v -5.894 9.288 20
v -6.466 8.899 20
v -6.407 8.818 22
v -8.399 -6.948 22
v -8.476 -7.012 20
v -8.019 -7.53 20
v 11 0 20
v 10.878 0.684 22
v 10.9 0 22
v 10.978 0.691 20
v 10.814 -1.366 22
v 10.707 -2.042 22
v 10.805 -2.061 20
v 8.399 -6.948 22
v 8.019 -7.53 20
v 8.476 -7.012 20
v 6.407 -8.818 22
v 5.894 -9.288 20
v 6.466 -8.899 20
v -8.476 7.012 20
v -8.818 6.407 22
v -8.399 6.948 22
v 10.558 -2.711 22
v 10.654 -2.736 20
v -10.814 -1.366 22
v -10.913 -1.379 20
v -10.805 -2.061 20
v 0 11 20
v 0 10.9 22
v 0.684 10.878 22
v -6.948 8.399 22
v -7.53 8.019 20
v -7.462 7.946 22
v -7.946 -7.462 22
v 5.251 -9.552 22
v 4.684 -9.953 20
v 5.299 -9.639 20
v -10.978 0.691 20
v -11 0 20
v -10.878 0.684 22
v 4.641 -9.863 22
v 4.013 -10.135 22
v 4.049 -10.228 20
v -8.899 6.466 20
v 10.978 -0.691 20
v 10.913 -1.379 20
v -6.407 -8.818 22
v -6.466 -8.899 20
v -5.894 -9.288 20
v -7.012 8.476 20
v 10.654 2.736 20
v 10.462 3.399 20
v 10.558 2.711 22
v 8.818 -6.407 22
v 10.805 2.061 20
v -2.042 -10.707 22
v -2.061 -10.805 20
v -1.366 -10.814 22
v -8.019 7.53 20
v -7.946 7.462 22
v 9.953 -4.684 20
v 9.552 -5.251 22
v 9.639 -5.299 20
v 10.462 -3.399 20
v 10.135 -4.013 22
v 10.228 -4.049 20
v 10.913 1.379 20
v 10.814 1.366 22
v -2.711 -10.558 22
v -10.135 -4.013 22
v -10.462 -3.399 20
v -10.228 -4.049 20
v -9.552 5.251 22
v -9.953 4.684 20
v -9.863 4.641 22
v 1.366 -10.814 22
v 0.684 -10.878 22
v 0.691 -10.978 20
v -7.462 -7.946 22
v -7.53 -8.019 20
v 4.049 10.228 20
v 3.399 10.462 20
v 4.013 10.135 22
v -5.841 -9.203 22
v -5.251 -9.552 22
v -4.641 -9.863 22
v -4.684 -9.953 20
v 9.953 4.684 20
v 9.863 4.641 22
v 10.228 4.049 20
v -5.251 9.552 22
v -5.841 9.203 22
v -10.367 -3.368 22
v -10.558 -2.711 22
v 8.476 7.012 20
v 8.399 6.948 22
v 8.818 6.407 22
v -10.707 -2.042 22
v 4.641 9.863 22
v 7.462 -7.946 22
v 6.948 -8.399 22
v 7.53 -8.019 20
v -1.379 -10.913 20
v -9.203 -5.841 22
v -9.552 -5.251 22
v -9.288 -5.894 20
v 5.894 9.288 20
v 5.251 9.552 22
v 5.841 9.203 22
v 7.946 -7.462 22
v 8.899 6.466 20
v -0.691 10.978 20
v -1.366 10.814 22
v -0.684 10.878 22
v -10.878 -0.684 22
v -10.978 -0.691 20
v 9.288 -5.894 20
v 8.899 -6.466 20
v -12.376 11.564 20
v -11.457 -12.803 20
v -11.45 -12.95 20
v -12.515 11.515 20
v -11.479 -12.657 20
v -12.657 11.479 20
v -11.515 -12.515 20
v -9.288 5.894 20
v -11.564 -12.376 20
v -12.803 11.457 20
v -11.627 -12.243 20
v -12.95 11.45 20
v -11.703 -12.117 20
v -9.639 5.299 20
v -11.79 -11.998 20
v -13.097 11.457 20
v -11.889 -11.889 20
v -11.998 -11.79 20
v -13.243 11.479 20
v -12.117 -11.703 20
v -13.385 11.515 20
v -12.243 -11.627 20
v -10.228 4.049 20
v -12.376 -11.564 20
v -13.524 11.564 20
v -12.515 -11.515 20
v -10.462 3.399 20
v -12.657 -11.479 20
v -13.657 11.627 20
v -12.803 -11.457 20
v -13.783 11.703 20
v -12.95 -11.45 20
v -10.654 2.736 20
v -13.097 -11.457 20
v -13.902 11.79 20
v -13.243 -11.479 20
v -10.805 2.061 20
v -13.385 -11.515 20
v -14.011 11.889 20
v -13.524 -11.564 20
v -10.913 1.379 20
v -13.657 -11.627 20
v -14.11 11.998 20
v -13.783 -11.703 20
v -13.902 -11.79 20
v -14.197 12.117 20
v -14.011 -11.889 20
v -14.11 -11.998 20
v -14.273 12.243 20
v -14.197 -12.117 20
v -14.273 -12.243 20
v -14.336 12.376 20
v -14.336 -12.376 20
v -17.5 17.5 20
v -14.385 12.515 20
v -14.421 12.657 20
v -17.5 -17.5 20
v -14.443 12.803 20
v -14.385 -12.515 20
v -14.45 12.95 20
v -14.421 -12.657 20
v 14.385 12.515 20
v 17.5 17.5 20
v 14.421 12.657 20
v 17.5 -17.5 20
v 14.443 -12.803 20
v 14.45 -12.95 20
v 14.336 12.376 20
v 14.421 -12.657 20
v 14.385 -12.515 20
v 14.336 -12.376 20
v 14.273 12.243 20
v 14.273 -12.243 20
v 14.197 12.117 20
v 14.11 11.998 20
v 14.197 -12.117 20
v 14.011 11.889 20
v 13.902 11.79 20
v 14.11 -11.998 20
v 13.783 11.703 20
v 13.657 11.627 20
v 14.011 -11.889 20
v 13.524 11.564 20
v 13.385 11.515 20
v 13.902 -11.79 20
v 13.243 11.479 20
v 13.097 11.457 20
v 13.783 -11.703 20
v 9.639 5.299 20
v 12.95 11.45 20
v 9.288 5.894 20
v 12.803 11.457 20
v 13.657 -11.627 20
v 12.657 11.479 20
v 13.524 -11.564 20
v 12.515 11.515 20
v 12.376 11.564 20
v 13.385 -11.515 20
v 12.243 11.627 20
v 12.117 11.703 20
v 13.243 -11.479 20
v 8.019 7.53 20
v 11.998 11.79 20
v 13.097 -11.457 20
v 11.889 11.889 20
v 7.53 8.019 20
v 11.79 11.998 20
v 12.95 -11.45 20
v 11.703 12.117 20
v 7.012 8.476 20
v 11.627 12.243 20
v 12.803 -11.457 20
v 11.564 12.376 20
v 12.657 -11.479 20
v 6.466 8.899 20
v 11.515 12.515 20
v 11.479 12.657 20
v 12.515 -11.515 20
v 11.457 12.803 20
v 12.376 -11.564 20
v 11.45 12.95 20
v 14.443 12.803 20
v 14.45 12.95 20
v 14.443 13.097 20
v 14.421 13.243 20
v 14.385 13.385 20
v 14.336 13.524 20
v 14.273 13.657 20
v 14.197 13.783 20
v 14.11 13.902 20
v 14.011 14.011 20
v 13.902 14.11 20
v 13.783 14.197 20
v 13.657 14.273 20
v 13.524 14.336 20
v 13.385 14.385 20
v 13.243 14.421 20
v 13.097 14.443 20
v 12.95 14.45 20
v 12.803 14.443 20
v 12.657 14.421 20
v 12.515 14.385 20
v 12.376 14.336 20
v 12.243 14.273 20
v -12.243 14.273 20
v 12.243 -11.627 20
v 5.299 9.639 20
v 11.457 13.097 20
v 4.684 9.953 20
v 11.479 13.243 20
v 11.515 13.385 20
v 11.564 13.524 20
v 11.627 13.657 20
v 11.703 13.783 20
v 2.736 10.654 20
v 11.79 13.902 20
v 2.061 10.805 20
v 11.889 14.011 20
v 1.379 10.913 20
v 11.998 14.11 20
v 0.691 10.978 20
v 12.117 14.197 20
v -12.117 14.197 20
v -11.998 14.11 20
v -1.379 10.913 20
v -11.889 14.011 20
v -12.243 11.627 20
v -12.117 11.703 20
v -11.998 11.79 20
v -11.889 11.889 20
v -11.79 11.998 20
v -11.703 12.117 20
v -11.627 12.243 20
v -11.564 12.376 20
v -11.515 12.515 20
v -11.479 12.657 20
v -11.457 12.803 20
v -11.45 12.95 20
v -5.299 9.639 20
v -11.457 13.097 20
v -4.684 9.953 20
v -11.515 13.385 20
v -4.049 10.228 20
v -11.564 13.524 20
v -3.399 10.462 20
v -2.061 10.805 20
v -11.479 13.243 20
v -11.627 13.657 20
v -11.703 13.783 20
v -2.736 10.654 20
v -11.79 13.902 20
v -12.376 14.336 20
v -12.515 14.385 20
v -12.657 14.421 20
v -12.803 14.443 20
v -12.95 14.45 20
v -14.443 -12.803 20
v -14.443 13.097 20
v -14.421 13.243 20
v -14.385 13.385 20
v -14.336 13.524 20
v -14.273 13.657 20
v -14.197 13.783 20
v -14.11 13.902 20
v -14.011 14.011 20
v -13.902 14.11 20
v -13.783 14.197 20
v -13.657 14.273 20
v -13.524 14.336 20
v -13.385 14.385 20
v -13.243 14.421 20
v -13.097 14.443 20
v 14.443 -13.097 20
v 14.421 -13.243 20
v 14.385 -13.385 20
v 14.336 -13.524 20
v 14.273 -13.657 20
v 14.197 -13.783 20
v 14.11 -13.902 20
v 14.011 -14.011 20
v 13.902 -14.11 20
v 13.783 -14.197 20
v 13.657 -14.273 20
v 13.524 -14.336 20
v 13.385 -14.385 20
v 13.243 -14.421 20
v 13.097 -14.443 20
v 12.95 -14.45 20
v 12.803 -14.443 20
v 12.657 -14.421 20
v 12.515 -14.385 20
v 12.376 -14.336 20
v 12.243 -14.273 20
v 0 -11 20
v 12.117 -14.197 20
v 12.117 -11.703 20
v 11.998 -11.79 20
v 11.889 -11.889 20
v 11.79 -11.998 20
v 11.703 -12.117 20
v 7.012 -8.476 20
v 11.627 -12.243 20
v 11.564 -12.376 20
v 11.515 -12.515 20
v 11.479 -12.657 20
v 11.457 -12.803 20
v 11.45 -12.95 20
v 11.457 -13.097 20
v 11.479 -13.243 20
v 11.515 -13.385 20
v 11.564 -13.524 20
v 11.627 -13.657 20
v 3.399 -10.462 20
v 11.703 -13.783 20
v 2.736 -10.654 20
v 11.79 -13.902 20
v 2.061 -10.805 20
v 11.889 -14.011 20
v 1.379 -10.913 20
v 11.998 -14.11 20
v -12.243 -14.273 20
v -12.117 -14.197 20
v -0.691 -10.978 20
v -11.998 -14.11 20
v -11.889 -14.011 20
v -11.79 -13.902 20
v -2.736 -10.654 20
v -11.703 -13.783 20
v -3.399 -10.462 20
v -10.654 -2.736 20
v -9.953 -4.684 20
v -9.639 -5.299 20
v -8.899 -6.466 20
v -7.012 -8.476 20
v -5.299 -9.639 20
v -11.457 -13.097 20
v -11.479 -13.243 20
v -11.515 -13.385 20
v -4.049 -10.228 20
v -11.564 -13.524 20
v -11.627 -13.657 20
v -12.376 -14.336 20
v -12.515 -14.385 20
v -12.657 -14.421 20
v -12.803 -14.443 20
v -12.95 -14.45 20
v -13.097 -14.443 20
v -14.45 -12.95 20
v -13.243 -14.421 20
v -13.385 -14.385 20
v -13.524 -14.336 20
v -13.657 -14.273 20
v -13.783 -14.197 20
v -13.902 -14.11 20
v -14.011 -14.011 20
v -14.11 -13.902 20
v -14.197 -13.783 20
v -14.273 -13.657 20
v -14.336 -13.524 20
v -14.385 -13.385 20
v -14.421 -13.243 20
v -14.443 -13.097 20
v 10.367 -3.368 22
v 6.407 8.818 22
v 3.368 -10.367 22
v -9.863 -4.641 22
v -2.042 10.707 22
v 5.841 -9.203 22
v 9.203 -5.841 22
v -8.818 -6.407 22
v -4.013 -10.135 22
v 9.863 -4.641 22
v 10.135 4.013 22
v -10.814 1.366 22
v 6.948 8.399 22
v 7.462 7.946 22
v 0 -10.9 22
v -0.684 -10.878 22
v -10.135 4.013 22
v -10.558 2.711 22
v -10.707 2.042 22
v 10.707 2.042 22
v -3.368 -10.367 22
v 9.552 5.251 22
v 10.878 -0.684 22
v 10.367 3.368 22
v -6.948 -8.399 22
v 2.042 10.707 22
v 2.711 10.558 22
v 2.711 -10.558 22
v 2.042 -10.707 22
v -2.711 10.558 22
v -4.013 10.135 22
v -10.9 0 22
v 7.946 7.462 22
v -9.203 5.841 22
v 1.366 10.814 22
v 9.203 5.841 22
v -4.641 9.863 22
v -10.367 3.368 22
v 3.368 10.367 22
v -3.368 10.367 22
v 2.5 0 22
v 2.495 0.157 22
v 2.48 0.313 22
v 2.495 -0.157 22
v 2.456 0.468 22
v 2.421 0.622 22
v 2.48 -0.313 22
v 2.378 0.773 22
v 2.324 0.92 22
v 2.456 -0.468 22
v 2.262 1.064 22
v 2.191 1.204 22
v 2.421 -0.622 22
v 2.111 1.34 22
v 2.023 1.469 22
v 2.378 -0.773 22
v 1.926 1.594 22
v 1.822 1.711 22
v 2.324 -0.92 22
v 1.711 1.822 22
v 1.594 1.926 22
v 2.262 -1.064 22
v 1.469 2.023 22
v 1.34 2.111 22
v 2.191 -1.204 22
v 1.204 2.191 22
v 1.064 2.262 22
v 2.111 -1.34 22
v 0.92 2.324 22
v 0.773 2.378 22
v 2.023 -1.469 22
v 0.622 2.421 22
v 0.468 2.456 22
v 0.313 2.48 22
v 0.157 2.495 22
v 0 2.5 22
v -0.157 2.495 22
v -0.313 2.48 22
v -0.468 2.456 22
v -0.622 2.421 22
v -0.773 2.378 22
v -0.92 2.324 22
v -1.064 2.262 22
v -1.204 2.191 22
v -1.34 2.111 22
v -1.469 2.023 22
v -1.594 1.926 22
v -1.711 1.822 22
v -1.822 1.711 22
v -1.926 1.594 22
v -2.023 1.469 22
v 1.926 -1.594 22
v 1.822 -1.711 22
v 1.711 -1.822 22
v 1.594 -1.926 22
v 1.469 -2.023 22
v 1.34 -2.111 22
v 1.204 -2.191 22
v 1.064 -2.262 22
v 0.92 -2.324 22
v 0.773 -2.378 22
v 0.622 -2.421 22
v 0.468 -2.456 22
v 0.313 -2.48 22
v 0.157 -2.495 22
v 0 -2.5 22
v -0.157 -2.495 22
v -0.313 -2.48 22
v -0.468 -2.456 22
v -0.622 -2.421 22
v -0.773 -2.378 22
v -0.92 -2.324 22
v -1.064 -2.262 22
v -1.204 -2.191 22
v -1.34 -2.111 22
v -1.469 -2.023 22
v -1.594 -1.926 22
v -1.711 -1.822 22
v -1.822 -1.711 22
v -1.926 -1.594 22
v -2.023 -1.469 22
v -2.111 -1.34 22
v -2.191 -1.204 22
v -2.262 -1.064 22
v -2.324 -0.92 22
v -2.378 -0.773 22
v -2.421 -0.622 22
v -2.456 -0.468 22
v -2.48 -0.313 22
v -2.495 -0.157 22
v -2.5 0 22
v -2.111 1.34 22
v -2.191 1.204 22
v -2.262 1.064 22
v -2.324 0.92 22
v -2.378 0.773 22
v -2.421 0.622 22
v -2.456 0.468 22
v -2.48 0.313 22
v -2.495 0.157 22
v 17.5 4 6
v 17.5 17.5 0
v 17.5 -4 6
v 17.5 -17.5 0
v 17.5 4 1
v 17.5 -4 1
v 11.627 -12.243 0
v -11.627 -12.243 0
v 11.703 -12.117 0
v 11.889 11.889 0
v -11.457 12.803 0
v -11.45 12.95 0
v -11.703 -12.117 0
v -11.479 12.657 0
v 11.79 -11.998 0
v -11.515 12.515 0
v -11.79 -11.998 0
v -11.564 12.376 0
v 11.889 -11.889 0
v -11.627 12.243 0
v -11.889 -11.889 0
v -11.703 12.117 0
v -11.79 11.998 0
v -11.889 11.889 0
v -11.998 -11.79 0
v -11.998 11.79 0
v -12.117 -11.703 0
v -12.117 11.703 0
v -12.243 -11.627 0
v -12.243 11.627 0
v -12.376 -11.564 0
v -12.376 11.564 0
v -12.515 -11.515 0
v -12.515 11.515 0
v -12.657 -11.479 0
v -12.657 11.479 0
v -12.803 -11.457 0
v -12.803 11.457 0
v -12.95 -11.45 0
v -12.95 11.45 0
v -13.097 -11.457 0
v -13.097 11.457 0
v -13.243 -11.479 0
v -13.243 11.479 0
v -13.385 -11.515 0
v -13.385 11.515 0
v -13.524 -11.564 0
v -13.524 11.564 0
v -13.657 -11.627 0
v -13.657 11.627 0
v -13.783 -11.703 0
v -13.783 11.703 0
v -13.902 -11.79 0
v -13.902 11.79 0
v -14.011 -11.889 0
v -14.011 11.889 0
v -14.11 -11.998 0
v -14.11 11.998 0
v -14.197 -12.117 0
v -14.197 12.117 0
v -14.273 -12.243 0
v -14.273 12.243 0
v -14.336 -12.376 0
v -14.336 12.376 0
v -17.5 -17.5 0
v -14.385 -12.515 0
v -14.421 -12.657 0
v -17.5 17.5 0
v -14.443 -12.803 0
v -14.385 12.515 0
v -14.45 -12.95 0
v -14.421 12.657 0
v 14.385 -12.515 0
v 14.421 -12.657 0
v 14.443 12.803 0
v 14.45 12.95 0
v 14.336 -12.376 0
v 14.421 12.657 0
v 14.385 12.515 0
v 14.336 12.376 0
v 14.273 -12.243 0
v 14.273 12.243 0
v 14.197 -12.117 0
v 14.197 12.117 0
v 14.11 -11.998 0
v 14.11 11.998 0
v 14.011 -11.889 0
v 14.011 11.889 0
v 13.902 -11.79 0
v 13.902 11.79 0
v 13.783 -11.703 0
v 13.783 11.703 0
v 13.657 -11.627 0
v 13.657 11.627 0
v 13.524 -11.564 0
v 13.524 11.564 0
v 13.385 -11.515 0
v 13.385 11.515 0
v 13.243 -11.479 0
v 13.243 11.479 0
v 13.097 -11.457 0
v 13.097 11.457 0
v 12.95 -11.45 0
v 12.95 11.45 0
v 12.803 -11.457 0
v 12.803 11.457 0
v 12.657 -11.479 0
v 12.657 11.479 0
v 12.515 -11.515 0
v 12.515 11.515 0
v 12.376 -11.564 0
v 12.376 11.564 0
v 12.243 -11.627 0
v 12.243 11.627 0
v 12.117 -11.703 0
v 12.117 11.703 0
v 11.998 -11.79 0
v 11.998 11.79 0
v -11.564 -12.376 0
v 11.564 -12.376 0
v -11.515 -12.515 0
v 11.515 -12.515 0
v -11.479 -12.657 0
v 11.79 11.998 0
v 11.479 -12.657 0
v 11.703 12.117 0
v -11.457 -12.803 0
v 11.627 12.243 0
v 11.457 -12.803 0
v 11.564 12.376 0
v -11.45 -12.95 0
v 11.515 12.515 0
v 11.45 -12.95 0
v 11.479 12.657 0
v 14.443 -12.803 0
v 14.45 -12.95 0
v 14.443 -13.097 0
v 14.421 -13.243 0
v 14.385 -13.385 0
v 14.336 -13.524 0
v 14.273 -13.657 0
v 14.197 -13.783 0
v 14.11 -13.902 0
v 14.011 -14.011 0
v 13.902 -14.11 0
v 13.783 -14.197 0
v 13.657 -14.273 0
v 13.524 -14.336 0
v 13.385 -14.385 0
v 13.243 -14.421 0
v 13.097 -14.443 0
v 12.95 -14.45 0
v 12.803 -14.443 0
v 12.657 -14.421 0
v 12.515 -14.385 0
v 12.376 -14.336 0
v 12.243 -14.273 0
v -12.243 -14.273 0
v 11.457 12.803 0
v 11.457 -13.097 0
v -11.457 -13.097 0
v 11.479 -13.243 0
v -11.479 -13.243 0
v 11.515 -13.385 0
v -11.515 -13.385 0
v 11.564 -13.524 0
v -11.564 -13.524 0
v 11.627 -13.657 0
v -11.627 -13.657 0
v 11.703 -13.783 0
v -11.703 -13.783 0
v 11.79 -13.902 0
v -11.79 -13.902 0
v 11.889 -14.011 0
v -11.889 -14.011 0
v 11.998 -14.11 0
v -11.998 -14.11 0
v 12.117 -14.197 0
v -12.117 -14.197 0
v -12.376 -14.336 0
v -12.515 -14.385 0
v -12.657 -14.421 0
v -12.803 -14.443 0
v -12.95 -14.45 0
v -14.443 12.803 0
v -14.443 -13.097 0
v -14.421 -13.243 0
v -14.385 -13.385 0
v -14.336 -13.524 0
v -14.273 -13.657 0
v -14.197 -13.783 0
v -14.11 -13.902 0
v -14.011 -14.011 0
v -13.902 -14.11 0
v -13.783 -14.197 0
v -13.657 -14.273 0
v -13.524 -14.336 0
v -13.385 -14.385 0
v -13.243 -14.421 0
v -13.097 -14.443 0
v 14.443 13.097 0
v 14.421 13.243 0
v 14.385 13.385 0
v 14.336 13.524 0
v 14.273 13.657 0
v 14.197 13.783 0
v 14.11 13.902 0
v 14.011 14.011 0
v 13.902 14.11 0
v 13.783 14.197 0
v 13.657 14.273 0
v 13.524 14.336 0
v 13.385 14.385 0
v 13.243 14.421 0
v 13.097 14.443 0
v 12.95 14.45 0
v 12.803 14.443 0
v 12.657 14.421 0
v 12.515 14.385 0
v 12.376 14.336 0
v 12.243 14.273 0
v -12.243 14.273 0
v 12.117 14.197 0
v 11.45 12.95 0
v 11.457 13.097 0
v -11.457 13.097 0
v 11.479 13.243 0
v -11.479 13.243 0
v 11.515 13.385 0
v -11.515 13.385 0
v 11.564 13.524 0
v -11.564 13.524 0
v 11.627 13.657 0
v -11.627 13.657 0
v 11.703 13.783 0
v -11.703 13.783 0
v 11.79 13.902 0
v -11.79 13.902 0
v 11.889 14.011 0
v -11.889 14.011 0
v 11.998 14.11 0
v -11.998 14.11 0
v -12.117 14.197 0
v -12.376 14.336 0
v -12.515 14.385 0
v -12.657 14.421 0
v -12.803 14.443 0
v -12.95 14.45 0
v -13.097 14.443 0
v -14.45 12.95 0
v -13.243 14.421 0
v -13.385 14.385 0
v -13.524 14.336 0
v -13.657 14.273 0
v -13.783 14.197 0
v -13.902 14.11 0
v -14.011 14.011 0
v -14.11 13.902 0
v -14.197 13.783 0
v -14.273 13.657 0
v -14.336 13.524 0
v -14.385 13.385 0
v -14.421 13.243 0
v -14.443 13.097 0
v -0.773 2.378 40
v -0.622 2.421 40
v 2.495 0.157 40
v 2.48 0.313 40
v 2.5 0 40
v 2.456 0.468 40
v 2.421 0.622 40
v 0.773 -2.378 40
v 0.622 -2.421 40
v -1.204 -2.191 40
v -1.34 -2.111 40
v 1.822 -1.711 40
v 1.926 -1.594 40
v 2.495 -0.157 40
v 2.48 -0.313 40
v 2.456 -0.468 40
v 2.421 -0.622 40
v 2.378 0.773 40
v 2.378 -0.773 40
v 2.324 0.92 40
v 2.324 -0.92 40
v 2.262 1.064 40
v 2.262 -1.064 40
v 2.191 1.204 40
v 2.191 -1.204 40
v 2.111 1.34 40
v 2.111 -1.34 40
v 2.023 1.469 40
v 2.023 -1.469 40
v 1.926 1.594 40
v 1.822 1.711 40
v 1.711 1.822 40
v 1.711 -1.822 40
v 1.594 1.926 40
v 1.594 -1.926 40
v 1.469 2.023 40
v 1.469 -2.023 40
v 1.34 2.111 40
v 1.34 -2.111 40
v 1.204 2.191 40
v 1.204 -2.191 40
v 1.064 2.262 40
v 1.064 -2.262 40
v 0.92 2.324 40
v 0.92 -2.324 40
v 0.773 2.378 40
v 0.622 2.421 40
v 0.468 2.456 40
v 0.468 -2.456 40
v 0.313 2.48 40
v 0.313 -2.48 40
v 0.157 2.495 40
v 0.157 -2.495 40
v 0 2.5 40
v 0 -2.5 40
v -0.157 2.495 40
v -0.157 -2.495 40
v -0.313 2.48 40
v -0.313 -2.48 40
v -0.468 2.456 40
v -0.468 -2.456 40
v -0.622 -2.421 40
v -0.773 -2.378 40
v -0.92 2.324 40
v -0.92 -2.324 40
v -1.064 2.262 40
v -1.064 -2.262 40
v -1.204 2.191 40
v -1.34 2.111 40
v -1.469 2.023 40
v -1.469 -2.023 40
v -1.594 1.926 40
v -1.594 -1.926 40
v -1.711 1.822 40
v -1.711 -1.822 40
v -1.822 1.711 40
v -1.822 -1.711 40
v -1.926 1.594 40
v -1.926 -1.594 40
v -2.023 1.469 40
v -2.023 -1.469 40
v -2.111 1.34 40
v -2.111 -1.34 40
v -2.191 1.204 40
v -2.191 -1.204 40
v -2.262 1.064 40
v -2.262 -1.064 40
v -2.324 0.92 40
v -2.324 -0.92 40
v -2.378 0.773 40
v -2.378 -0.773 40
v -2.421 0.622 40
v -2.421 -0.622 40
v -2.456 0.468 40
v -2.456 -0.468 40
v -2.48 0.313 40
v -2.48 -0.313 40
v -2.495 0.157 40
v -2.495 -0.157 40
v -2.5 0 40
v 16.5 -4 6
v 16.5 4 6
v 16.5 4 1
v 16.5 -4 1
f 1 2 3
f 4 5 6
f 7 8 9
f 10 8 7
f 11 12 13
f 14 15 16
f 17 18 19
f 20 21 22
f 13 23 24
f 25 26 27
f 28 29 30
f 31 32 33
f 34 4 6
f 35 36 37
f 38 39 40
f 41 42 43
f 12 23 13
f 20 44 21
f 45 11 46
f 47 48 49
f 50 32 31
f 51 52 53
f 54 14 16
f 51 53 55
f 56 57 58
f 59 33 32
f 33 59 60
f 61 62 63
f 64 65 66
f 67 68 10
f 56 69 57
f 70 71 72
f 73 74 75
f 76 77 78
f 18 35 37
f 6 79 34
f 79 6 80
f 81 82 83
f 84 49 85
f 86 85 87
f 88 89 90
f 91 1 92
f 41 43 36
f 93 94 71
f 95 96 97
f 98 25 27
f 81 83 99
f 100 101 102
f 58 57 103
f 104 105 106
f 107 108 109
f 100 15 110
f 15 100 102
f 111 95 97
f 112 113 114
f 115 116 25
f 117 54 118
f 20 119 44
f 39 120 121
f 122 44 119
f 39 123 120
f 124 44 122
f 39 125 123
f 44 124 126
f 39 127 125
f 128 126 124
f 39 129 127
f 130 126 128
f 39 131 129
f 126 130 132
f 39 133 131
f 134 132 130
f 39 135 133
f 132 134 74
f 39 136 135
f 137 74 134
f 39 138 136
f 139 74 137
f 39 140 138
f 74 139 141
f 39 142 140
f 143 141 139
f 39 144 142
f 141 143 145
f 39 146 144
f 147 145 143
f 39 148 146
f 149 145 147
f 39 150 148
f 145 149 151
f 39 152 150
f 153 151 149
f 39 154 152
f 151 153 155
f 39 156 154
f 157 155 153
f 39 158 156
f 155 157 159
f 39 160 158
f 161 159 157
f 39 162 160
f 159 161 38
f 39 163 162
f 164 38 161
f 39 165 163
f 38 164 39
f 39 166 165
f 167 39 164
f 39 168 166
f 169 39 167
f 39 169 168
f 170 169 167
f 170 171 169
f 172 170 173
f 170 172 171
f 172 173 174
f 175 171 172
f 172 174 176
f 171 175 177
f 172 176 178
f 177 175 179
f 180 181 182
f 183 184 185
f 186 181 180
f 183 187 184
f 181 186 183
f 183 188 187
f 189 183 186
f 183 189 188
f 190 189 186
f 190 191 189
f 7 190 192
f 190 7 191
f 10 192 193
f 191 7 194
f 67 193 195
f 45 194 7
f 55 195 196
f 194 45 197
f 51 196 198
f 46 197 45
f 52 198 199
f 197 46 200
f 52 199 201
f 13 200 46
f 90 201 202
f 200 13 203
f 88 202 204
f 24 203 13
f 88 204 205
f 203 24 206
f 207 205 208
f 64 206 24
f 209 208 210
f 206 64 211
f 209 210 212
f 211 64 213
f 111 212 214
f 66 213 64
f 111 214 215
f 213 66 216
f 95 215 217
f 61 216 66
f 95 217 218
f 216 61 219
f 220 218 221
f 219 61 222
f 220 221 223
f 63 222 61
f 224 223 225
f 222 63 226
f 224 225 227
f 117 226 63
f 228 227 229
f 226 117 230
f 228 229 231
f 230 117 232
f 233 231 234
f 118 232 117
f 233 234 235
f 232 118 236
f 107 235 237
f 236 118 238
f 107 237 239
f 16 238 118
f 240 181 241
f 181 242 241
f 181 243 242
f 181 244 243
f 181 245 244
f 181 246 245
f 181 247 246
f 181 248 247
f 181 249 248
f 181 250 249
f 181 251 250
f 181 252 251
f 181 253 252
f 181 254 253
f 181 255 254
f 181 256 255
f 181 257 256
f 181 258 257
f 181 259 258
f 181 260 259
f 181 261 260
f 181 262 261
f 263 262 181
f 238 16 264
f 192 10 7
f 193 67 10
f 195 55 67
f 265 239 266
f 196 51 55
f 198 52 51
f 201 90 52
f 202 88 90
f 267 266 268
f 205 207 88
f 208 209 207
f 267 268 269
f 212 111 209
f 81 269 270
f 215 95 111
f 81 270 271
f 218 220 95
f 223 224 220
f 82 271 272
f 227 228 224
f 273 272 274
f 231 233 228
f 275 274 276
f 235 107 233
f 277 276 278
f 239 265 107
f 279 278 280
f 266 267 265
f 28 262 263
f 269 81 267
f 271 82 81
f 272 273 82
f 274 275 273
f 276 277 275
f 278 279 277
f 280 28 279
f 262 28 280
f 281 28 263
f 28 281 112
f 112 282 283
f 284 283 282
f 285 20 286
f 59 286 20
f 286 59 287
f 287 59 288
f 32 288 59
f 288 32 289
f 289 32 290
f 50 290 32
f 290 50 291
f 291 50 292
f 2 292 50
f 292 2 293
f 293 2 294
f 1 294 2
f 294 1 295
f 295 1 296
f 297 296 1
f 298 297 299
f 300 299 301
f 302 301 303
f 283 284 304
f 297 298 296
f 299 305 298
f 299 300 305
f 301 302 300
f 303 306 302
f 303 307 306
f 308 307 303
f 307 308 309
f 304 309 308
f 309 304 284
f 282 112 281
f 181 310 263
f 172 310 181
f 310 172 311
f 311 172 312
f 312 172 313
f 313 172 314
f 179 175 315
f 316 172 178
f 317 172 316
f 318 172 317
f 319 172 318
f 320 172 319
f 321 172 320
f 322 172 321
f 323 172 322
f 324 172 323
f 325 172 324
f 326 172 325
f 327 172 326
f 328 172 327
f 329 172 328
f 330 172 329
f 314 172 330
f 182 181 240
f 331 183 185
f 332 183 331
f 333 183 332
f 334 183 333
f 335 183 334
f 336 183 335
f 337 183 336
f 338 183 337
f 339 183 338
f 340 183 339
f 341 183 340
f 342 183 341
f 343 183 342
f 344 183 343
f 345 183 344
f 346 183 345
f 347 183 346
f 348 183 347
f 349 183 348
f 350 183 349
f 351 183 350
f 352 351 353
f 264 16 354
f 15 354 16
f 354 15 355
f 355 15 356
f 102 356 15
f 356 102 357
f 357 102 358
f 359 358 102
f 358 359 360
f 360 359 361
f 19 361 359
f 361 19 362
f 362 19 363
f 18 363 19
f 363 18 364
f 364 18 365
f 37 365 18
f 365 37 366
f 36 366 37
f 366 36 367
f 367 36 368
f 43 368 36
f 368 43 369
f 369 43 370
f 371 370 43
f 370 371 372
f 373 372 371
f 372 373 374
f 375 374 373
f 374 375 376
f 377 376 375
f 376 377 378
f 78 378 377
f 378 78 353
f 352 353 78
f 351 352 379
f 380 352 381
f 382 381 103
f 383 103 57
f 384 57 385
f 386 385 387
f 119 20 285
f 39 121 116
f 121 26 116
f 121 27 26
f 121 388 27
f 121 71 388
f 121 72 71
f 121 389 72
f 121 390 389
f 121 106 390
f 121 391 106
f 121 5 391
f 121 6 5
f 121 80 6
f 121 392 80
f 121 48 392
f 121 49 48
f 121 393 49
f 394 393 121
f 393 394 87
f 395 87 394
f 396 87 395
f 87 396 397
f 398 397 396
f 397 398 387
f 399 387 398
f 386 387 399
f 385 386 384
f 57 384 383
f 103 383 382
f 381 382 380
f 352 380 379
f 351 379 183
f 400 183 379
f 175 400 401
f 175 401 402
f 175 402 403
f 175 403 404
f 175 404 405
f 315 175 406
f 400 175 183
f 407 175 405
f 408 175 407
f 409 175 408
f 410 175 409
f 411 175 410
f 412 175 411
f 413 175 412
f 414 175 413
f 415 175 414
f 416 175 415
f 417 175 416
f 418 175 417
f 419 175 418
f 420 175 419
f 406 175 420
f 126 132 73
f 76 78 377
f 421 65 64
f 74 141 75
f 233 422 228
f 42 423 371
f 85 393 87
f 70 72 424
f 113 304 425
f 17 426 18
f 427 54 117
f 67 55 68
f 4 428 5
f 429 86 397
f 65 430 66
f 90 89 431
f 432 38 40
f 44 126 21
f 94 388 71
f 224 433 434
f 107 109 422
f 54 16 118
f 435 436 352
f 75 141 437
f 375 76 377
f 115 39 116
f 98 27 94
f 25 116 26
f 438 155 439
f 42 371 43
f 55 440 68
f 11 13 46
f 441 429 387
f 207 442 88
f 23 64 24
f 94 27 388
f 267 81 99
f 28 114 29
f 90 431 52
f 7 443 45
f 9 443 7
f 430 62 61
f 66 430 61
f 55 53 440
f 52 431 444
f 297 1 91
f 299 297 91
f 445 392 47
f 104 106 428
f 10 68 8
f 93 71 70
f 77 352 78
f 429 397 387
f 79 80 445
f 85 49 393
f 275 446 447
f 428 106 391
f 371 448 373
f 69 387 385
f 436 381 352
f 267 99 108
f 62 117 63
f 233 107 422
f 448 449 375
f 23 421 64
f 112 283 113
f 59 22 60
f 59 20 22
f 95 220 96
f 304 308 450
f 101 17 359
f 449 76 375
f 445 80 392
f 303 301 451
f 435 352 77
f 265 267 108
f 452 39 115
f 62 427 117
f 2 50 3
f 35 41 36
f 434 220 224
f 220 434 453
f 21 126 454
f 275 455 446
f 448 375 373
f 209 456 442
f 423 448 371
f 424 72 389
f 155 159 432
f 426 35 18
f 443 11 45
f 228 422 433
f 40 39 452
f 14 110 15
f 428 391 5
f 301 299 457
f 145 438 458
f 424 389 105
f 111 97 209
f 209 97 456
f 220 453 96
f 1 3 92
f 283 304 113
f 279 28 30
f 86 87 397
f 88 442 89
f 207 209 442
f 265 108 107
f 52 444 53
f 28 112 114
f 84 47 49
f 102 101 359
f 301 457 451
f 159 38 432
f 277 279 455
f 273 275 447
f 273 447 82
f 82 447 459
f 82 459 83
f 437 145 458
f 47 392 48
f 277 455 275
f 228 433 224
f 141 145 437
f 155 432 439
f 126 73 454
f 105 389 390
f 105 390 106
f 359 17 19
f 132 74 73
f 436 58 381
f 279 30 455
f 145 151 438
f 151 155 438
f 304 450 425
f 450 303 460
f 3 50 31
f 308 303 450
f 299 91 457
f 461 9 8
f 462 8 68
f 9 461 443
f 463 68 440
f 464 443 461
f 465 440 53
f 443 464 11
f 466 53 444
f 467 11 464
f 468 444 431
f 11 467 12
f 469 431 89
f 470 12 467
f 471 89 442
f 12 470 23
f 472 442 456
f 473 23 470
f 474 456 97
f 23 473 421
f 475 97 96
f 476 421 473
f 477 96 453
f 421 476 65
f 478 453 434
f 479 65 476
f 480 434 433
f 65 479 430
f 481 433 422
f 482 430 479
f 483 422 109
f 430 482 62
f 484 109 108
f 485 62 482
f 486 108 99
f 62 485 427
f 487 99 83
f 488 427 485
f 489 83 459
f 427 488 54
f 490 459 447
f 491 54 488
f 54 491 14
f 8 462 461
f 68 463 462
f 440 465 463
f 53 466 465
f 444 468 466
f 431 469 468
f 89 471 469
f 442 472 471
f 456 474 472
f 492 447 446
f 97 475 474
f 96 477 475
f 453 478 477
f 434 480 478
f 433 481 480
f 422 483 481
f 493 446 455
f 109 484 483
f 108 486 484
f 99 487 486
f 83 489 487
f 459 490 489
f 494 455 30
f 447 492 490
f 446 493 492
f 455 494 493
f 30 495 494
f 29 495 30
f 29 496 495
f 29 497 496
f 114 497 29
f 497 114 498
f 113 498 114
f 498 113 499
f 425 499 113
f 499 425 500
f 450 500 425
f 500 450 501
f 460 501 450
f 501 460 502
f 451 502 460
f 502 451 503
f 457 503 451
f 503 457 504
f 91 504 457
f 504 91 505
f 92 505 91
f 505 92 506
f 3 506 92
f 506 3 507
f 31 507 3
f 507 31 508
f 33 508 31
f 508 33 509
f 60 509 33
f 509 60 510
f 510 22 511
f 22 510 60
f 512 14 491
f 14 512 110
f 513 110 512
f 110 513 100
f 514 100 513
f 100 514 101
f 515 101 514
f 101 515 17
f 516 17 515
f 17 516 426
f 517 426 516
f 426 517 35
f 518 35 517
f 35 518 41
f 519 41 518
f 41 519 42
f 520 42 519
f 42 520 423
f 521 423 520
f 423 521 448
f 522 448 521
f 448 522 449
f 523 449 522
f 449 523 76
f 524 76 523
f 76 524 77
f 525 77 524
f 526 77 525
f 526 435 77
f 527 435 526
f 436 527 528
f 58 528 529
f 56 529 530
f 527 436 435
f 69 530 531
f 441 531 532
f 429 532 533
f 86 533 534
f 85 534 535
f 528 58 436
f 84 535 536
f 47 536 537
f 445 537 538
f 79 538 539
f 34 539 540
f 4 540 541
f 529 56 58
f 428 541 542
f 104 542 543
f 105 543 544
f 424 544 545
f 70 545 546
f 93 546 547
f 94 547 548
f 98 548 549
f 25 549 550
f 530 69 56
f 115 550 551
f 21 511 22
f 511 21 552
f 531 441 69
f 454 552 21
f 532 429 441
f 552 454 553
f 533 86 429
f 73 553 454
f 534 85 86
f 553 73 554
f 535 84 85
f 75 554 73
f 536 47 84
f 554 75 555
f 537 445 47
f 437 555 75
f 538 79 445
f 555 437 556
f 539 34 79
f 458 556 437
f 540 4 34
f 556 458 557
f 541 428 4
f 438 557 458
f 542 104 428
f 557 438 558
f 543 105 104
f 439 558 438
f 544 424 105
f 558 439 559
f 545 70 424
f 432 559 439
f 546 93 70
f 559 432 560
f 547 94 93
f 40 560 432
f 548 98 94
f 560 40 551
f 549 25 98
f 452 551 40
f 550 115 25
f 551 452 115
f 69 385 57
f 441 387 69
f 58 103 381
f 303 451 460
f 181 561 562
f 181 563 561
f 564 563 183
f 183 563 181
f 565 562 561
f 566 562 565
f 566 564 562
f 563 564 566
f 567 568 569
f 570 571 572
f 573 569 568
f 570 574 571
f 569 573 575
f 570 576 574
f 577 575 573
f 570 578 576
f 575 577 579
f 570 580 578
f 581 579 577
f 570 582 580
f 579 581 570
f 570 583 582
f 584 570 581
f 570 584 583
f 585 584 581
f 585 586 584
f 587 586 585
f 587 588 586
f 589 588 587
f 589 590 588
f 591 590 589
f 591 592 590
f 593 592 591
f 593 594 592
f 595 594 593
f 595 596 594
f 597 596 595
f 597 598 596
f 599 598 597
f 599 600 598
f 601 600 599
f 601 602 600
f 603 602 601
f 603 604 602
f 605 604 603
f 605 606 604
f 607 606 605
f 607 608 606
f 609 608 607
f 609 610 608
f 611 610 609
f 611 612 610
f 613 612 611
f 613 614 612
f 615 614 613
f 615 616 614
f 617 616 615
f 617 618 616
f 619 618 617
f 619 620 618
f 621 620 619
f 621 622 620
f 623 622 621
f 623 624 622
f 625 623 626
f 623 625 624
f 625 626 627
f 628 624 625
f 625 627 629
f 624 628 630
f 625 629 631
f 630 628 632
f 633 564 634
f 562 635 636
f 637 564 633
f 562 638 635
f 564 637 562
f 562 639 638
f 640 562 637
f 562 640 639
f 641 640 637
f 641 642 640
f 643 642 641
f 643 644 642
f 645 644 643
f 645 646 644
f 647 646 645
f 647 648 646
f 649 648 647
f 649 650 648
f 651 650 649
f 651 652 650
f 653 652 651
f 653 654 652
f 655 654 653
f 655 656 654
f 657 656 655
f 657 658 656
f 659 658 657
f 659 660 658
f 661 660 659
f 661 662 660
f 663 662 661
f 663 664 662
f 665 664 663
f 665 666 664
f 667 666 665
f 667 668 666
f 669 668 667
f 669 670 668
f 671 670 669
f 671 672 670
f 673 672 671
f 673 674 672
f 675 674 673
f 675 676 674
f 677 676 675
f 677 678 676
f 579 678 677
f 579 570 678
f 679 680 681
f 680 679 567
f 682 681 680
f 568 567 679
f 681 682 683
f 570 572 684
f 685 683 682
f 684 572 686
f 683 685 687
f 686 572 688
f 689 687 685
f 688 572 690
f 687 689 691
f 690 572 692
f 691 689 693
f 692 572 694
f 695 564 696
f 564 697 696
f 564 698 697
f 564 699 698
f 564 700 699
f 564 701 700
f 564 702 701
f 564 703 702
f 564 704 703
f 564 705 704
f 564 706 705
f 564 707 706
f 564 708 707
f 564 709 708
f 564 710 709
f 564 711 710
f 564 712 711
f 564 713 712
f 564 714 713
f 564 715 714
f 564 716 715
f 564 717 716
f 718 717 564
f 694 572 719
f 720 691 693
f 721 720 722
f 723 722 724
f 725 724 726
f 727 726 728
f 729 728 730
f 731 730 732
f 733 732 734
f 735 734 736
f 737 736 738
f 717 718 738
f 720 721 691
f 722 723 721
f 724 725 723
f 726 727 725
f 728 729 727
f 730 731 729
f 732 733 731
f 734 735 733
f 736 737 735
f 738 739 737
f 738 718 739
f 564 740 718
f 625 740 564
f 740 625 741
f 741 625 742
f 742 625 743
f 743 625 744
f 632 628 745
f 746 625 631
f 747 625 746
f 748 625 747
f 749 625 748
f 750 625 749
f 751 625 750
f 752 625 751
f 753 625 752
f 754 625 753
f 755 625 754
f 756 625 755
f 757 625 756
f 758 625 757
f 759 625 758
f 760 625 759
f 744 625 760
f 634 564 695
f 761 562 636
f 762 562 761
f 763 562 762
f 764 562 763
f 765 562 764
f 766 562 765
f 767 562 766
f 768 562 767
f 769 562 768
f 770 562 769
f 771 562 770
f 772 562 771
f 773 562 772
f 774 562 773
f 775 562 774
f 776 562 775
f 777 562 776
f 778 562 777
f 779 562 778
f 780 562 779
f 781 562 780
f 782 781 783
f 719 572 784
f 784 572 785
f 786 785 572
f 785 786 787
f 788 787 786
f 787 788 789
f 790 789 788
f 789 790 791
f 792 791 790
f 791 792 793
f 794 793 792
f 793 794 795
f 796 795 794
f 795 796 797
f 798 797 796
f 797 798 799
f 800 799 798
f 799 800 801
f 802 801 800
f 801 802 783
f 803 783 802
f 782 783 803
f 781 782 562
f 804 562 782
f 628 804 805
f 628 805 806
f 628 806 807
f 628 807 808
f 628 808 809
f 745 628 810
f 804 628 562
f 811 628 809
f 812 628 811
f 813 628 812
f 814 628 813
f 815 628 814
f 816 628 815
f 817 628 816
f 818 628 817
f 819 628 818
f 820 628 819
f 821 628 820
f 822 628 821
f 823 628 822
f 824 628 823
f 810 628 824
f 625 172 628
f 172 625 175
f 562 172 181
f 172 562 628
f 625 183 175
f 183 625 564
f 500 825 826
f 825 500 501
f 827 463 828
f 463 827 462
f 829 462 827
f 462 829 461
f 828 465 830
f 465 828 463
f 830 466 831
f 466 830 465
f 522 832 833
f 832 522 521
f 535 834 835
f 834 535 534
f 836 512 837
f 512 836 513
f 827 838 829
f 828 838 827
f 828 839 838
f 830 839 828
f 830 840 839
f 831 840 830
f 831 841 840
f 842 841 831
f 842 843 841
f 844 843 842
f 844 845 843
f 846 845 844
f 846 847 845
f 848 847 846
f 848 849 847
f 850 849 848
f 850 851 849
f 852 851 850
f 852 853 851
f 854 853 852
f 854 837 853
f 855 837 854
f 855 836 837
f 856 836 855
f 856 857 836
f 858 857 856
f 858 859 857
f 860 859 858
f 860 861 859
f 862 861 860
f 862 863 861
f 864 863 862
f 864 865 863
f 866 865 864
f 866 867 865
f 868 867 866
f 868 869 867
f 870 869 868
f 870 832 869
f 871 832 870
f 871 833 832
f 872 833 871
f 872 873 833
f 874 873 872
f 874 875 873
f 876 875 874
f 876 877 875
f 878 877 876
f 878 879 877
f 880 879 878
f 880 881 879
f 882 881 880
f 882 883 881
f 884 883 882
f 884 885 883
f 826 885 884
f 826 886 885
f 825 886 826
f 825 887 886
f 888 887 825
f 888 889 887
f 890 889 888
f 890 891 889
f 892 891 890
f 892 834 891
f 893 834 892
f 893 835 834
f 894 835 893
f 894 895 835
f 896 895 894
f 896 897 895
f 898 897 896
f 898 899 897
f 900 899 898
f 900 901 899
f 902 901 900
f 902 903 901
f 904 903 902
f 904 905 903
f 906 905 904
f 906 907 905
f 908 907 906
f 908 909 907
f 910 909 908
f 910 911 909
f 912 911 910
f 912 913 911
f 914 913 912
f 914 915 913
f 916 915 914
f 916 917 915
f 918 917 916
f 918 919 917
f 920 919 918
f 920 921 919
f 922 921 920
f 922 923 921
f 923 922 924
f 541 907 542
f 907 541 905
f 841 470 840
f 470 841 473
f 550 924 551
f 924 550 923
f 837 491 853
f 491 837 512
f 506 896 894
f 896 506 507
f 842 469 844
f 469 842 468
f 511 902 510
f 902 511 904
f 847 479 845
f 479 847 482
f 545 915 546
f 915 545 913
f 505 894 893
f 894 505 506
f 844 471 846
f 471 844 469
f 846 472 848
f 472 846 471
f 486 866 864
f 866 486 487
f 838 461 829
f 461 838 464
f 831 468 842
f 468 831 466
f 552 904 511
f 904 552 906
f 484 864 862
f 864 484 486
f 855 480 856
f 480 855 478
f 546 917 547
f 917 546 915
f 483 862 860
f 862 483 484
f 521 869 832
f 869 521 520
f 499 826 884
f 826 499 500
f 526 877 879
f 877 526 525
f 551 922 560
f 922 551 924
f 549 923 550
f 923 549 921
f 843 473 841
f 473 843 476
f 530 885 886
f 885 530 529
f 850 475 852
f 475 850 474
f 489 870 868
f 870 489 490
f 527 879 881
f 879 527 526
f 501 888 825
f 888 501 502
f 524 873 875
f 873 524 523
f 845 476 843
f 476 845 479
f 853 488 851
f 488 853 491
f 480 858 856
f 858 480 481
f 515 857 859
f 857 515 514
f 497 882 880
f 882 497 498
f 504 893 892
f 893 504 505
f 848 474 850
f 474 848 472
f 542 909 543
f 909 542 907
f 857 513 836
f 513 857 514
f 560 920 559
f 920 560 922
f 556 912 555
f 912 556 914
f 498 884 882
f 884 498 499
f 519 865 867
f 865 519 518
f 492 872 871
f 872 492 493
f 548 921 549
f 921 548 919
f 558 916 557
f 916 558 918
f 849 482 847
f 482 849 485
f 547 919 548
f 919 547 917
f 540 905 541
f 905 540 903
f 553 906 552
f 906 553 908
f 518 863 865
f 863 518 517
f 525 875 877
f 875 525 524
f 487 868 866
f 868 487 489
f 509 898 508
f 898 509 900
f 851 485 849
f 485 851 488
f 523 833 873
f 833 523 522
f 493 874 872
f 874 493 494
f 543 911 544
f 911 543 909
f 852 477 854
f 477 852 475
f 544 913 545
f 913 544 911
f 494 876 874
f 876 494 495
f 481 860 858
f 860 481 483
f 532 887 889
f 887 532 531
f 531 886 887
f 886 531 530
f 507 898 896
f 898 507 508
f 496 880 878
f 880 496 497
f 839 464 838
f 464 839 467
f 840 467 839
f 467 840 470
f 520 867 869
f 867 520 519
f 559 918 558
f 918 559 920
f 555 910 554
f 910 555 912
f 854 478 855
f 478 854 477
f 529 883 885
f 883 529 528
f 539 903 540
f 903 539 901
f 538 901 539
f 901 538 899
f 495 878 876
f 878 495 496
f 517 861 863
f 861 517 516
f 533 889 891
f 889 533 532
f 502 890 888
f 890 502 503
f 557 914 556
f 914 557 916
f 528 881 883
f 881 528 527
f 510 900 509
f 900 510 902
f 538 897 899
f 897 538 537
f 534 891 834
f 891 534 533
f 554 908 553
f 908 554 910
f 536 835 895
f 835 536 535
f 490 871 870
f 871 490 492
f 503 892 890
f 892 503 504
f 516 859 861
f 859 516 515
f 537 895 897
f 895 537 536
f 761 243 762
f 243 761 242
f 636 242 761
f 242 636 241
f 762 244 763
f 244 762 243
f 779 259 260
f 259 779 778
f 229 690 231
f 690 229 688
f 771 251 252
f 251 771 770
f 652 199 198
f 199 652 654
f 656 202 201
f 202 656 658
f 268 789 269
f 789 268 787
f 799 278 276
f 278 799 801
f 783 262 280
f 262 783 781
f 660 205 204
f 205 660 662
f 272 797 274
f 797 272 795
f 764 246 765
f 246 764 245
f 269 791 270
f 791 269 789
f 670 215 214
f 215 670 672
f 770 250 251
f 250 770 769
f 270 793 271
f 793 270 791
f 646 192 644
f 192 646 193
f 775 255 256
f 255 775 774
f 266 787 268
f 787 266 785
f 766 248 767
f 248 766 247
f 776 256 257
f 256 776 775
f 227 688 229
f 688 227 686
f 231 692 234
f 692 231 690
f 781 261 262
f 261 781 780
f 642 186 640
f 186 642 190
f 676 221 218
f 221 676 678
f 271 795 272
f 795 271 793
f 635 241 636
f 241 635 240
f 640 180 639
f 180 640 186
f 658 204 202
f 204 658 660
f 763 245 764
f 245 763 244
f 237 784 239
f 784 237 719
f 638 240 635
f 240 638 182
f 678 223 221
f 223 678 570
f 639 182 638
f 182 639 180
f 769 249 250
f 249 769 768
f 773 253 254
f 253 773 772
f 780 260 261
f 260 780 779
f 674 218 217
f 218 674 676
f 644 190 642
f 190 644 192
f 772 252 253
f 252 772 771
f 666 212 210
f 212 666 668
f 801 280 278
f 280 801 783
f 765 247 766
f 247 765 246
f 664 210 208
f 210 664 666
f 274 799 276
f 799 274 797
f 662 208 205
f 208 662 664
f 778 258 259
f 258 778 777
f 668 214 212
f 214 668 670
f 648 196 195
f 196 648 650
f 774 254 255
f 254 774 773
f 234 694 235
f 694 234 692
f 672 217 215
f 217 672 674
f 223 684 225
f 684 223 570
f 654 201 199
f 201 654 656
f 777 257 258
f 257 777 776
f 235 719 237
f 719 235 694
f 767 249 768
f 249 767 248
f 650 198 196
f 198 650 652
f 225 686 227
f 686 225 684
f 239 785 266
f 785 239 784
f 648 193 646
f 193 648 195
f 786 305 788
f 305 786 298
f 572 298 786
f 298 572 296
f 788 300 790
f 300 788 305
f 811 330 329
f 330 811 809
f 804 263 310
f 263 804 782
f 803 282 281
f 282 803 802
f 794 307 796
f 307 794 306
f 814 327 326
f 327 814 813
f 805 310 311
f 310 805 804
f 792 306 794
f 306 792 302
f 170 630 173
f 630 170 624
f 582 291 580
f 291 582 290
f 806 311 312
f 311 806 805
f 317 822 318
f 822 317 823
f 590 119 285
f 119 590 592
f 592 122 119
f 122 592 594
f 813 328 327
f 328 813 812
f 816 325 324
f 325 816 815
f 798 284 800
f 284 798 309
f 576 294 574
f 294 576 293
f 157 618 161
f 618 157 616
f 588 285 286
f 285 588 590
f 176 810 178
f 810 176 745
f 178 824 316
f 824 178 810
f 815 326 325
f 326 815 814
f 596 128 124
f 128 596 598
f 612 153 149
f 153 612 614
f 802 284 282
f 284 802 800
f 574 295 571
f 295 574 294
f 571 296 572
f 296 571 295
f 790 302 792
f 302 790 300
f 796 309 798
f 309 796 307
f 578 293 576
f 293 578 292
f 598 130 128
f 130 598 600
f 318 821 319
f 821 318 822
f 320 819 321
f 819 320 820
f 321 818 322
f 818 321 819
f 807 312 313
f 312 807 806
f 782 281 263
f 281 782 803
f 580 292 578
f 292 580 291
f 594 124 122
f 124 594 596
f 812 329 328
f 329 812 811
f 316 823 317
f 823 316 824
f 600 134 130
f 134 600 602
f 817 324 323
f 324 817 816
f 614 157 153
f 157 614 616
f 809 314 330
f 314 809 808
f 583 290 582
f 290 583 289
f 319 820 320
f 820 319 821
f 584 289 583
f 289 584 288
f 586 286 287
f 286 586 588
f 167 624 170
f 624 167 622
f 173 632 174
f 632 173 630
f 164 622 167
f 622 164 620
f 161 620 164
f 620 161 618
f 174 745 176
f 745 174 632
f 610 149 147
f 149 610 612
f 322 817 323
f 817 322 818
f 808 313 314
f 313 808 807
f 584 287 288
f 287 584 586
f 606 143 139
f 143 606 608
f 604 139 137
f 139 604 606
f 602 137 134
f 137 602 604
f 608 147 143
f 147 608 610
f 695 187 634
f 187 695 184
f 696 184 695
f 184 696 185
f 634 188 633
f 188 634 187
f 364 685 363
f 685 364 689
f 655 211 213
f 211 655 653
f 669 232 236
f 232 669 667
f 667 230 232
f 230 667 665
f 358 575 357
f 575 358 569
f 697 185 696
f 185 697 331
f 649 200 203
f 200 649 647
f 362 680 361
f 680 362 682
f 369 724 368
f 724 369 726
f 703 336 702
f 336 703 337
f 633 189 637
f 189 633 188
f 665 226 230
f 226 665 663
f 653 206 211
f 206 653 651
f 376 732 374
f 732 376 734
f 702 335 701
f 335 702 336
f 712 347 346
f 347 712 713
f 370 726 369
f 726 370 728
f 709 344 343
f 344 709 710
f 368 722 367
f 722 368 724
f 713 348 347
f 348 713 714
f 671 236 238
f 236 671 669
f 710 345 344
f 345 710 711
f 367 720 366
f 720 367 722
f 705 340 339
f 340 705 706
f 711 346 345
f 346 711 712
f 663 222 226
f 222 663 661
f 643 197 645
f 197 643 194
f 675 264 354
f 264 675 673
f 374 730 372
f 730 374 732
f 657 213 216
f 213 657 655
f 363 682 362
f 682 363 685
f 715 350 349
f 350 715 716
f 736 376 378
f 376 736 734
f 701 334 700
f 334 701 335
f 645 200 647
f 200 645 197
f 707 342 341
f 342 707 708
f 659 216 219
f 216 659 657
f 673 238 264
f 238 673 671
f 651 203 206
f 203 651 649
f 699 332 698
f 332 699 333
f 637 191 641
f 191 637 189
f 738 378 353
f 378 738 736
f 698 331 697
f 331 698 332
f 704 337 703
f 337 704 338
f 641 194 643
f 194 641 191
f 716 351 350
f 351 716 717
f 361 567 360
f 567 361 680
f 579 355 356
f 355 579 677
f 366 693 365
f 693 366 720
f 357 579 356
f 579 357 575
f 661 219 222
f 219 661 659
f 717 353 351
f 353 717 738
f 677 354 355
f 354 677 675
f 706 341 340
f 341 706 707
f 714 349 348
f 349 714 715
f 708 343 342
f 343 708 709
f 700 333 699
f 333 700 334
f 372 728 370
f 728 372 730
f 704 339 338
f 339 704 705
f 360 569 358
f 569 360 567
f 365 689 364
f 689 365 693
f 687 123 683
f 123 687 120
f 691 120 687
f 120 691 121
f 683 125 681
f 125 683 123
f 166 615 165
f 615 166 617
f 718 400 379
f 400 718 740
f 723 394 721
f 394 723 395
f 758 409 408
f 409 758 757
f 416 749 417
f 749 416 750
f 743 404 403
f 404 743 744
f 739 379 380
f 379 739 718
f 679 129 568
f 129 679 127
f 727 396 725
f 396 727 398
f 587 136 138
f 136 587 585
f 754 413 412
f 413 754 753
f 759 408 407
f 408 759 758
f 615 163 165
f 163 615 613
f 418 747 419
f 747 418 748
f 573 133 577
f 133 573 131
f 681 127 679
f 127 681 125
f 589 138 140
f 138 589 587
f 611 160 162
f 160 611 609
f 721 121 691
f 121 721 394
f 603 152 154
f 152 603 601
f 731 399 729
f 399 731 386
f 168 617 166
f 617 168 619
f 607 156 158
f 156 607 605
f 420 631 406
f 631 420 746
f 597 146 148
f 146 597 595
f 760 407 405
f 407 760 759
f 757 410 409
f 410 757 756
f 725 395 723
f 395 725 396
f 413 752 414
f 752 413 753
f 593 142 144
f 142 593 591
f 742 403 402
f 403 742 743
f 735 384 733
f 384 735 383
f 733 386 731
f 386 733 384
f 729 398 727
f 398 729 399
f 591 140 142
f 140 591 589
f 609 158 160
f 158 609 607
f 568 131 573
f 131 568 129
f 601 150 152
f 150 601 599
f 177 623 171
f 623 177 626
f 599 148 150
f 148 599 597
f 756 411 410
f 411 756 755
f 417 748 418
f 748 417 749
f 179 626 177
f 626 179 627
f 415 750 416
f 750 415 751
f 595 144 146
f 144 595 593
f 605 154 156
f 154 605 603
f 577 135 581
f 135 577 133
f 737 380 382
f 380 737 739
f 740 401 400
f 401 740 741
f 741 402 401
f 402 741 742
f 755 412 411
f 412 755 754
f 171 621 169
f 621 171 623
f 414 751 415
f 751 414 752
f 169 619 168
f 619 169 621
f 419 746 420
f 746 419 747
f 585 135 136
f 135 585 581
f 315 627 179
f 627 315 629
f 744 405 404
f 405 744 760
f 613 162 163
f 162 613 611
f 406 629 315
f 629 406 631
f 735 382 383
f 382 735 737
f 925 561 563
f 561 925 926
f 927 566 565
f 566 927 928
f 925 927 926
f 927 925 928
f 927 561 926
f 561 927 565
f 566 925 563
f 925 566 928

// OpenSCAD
use <lib-Threads.scad>

//use <part-Shaft_Coupling.scad>


// ++++++++++++++++++++++++++++++++++++
// Motor parameter
// ++++++++++++++++++++++++++++++++++++
motorWidth=35;
motorHeight=35;
motorDepth=20;

motorShaftHeight=20;
motorShaftDiameter=5;
motorShaftTolerance=0.001; // +0,1%


// ---------------------------------------------------------------------------------


module PSM35BYG104 (
	shaftCouplingHeight=20,
	shaftCouplingDiameter=8,
	numberOfLockingScrews=1,
	lockingScrew="None",
	lockingScrewHeight=15,
    debug=true
) 

difference () 
{
    union() 
    {  
        translate([0,0,motorDepth]) 
        {
        difference () 
        {     
            color([0.3,0.3,0.3]) cylinder(motorShaftHeight, motorShaftDiameter/2, motorShaftDiameter/2, $fn=100);

//            shaftCoupling(
//                shaftCouplingHeight, 
//                shaftCouplingDiameter, 
//                motorShaftHeight+(motorShaftHeight*motorShaftTolerance), 
//                motorShaftDiameter+(motorShaftDiameter*motorShaftTolerance), 
//                numberOfLockingScrews,
//                lockingScrew, 
//                lockingScrewHeight
//            );
        }
        }
        
        union() 
        {
            translate([0,0,(motorDepth)]) 
            {
            color([0.5,0.5,0.5]) cylinder(2, 22/2, 22/2 -0.1, $fn=100);
            }
            translate([0,0,(motorDepth/2)]) 
            { 
                color([0.6,0.6,0.6]) cube(size = [motorWidth,motorHeight,motorDepth], center = true);
            }            
        }
    }
     
    translate([12.95,12.95,0]) 
    {
        metricThread(name="M3", height=motorDepth, internalThread=true, debug=debug);
    }
    translate([-12.95,12.95,0]) 
    {
        metricThread(name="M3", height=motorDepth, internalThread=true, debug=debug);
    }
    translate([12.95,-12.95,0]) 
    {
        metricThread(name="M3", height=motorDepth, internalThread=true, debug=debug);
    }
    translate([-12.95,-12.95,0]) 
    {
        metricThread(name="M3", height=motorDepth, internalThread=true, debug=debug);
    }
    translate([motorWidth/2,0,3.5]) 
    {
        cube(size = [2,8,5], center = true);
    }
}



// ---------------------------------------------------------------------------------

function getMotorWidth() = motorWidth;
function getMotorHeight() = motorHeight;
function getMotorDepth() = motorDepth;

function getMotorShaftHeight() = motorShaftHeight;
function getMotorShaftDiameter() = motorShaftDiameter;
function getMotorShaftTolerance() = motorShaftTolerance;

// ---------------------------------------------------------------------------------

PSM35BYG104();

   
